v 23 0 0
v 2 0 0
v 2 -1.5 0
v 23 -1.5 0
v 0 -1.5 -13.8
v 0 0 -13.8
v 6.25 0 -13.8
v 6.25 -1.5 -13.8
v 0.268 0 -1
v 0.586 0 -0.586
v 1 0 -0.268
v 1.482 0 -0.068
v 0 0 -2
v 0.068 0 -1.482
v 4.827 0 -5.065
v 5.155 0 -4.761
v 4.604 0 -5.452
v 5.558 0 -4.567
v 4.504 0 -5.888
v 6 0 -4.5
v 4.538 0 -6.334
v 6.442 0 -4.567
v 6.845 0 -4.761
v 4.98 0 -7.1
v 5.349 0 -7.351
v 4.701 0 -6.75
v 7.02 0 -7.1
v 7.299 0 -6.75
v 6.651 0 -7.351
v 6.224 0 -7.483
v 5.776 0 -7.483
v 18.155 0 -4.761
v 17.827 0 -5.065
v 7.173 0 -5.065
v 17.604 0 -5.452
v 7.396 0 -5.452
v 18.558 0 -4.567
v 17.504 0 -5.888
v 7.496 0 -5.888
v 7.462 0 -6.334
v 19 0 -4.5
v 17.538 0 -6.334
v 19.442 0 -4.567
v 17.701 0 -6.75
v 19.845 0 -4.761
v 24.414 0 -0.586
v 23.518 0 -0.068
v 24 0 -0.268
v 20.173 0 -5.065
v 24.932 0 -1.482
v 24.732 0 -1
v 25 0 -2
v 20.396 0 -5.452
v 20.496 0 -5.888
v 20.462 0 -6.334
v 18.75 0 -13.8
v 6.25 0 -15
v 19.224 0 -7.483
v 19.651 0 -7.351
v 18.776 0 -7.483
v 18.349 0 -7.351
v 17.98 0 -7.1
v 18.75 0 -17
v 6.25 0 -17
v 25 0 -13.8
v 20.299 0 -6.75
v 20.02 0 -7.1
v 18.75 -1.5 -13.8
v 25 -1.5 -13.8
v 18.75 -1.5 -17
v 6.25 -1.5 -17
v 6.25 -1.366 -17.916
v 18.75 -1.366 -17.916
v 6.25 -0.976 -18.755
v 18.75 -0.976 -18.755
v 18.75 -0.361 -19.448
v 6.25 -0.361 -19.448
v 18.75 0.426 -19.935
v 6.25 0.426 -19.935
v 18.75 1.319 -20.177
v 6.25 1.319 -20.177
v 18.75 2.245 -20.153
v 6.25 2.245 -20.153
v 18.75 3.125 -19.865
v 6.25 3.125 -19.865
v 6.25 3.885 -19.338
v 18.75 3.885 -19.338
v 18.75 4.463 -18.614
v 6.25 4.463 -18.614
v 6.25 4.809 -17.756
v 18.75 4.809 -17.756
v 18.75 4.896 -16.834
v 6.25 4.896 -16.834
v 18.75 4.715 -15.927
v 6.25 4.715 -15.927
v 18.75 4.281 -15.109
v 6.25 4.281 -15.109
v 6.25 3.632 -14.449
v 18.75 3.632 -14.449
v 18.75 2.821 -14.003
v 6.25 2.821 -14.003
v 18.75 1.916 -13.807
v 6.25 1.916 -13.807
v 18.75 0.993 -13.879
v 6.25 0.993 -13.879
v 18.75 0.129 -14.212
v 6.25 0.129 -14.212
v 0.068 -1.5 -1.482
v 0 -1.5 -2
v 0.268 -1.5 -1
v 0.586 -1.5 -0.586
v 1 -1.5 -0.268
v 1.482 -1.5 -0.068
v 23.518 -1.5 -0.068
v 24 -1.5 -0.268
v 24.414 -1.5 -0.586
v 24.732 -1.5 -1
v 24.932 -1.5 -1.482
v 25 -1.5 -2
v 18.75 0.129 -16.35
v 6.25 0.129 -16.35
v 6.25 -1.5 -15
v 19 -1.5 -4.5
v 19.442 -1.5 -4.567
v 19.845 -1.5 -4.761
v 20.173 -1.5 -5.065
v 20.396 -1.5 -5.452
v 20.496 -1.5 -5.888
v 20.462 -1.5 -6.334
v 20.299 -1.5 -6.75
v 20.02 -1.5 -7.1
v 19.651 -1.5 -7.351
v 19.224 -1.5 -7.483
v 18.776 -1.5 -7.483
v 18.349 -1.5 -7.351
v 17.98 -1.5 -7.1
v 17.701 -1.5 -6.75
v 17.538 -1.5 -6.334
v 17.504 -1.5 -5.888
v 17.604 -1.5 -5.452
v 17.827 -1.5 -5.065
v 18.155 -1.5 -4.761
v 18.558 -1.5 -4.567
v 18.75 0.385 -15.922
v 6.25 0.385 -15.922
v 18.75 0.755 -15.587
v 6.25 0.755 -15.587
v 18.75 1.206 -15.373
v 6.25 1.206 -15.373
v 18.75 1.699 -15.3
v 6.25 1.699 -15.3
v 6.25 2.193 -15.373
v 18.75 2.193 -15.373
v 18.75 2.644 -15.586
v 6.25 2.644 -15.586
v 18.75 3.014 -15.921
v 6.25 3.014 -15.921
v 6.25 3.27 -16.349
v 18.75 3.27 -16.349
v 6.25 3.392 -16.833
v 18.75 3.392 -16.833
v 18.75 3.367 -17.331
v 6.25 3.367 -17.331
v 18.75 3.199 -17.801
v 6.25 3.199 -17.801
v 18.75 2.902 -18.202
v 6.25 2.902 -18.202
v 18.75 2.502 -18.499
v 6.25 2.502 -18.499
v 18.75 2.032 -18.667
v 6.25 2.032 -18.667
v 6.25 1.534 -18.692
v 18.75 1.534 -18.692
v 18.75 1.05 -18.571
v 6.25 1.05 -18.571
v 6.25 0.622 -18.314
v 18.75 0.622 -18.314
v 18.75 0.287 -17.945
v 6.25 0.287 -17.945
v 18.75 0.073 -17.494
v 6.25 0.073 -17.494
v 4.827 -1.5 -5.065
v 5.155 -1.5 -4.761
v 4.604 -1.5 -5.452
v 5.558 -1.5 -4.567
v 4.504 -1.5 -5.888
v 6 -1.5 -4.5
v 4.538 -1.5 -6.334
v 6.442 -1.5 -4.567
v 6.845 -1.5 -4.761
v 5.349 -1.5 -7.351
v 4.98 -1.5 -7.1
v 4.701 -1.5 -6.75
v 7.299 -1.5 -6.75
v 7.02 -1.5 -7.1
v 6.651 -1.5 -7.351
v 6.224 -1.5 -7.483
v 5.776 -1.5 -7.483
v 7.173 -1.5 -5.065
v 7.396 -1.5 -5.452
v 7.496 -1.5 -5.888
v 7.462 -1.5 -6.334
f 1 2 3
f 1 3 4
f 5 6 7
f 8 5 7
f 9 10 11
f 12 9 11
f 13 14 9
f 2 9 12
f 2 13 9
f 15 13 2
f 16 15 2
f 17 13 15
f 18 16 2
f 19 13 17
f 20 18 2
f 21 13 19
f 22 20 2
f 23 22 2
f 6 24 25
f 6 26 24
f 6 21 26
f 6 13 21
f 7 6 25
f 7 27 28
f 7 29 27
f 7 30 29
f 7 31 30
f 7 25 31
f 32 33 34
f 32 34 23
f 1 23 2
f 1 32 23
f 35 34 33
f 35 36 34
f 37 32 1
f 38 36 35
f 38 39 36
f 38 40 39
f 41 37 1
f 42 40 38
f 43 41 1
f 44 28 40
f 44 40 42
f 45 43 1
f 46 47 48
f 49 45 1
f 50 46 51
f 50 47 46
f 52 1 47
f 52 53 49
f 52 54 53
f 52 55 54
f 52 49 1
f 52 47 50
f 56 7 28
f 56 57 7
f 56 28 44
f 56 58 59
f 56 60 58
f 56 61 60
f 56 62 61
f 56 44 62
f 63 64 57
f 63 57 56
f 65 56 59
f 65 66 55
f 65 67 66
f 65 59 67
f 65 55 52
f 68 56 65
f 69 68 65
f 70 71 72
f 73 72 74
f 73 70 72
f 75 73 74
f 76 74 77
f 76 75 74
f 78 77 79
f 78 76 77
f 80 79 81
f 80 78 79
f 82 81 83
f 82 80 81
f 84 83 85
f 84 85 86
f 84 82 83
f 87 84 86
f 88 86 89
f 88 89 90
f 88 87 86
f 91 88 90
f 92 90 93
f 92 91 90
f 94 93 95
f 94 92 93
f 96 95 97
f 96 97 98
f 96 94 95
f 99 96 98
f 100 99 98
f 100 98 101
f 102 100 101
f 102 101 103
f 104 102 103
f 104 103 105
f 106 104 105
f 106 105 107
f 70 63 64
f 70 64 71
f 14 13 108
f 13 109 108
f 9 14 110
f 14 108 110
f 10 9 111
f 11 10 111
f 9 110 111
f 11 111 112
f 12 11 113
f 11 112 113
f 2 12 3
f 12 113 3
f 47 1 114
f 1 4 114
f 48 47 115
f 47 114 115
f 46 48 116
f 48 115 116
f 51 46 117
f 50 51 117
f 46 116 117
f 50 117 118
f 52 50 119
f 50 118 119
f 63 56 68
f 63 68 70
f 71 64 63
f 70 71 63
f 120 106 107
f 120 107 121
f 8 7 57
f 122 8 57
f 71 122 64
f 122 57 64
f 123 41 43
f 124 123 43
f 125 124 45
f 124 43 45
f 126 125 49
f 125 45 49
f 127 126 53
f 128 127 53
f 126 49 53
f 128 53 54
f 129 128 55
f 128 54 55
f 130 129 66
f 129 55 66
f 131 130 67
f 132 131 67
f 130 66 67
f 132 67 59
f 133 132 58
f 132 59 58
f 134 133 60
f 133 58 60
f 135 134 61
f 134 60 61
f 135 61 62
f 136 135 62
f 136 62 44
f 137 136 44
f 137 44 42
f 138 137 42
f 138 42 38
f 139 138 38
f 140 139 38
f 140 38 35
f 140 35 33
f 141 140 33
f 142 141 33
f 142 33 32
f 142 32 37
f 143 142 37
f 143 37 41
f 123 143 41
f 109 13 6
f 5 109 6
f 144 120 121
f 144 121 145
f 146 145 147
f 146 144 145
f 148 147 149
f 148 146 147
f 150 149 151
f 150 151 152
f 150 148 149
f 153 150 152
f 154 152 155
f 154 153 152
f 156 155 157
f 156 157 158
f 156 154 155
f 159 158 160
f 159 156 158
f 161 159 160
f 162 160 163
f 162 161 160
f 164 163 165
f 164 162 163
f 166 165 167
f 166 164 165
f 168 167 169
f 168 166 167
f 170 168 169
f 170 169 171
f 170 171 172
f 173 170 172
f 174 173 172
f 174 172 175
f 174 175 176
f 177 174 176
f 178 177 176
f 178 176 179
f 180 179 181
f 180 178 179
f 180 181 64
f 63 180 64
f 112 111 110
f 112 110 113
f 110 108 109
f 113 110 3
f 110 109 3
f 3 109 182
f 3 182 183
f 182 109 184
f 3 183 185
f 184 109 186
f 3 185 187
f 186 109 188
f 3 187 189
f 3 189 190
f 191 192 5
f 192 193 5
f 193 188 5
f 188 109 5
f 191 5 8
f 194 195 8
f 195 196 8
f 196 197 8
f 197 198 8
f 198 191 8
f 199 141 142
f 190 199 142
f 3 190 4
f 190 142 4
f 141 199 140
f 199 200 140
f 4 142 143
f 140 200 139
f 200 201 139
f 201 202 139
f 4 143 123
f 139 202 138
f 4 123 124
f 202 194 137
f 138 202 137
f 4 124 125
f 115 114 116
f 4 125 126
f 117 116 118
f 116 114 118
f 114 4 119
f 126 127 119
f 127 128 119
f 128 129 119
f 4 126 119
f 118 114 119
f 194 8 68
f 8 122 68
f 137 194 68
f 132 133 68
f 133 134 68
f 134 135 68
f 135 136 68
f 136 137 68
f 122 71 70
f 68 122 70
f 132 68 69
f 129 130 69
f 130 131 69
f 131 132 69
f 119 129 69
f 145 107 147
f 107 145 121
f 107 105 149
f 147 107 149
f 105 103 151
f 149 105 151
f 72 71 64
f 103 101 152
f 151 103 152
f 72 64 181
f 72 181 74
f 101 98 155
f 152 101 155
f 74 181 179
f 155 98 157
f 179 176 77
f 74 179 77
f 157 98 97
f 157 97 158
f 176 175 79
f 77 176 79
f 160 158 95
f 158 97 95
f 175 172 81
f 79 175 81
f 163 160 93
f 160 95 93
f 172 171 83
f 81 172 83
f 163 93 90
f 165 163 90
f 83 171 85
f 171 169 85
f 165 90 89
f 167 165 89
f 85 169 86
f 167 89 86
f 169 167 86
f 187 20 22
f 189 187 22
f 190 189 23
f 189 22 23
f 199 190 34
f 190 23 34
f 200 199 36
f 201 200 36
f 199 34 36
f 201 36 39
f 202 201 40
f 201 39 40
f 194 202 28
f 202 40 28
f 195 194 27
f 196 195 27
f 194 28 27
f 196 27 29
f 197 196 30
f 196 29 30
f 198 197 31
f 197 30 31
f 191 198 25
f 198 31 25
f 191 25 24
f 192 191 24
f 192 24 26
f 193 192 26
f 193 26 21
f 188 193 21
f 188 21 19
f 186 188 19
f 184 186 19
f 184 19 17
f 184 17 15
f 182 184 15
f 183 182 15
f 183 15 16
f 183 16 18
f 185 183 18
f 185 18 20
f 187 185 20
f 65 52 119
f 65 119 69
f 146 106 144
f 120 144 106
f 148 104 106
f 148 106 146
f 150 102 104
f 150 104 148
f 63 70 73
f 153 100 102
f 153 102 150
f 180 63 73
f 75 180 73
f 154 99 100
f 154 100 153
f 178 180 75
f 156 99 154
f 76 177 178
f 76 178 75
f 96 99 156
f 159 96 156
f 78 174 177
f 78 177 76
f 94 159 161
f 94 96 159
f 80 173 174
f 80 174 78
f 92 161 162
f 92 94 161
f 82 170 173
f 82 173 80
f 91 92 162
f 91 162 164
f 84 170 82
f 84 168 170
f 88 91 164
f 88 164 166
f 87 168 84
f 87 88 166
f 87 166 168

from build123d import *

# Parameters (mm, degrees)
SKETCH_1_W             = 25
SKETCH_1_H             = 15
SM_BASE_FLANGE_1_DEPTH = 1.5
SKETCH_6_W             = 12.5
SKETCH_6_H             = 2
EXTRUDE_1_DEPTH        = 1.5
SM_BASE_FLANGE_2_DEPTH = 12.5
SKETCH_10_R            = 1.5
CUT_EXTRUDE_1_DEPTH    = 33.512305363
FILLET_1_R             = 2
SKETCH_11_W            = 7.74464046
SKETCH_11_H            = 1.2
SKETCH_11_W_2          = 7.487333485
CUT_EXTRUDE_2_DEPTH    = 25


# Sheet-metal steps are written as plain solids
with BuildPart() as part:
    # Sketch 1 → 基体-法兰1 (new body)
    with BuildSketch(Plane(origin=(0, 0, 0), x_dir=(1, 0, 0), z_dir=(0, 1, 0))):
        with Locations((12.5, 7.5)):
            Rectangle(SKETCH_1_W, SKETCH_1_H)
    extrude(amount=-SM_BASE_FLANGE_1_DEPTH)

    # 草图6 → 凸台-拉伸1 (add)
    with BuildSketch(Plane(origin=(0, 0, 0), x_dir=(1, 0, 0), z_dir=(0, 1, 0))):
        with Locations((12.5, 16)):
            Rectangle(SKETCH_6_W, SKETCH_6_H)
    extrude(amount=-EXTRUDE_1_DEPTH)

    # 草图10 → 切除-拉伸1 (cut, through all)
    with BuildSketch(Plane(origin=(0, 0, 0), x_dir=(1, 0, 0), z_dir=(0, 1, 0))):
        with Locations(Location((19, 6, 0), (0, 0, 270))):
            Circle(SKETCH_10_R)
        with Locations(Location((6, 6, 0), (0, 0, 270))):
            Circle(SKETCH_10_R)
    extrude(amount=-CUT_EXTRUDE_1_DEPTH, mode=Mode.SUBTRACT)

    # 圆角1
    fillet_1_edges = [part.edges().sort_by_distance(p)[0] for p in [
        (25, -0.75, 0),
        (0, -0.75, 0),
    ]]
    fillet(fillet_1_edges, radius=FILLET_1_R)

    # 草图11 → 切除-拉伸2 (cut)
    with BuildSketch(Plane(origin=(0, 0, 0), x_dir=(1, 0, 0), z_dir=(0, 1, 0))):
        with Locations((22.62232023, 14.4)):
            Rectangle(SKETCH_11_W, SKETCH_11_H)
        with Locations((2.506333257, 14.4)):
            Rectangle(SKETCH_11_W_2, SKETCH_11_H)
    extrude(amount=-CUT_EXTRUDE_2_DEPTH, mode=Mode.SUBTRACT)


with BuildPart() as body_2:
    # 草图7 → 基体-法兰2 (new body)
    with BuildSketch(Plane(origin=(18.75, 0, 0), x_dir=(0, 0, -1), z_dir=(1, 0, 0))):
        with BuildLine():
            Line((17, 0), (17, -1.5))
            ThreePointArc((17, -1.5), (18.614461494, 4.462881482), (14.212146397, 0.129053697))
            Line((14.212146397, 0.129053697), (16.350286437, 0.129053697))
            ThreePointArc((16.350286437, 0.129053697), (17.331203325, 3.367424468), (17, 0))
        make_face()
    extrude(amount=-SM_BASE_FLANGE_2_DEPTH)


solid = Compound([part.part, body_2.part])
